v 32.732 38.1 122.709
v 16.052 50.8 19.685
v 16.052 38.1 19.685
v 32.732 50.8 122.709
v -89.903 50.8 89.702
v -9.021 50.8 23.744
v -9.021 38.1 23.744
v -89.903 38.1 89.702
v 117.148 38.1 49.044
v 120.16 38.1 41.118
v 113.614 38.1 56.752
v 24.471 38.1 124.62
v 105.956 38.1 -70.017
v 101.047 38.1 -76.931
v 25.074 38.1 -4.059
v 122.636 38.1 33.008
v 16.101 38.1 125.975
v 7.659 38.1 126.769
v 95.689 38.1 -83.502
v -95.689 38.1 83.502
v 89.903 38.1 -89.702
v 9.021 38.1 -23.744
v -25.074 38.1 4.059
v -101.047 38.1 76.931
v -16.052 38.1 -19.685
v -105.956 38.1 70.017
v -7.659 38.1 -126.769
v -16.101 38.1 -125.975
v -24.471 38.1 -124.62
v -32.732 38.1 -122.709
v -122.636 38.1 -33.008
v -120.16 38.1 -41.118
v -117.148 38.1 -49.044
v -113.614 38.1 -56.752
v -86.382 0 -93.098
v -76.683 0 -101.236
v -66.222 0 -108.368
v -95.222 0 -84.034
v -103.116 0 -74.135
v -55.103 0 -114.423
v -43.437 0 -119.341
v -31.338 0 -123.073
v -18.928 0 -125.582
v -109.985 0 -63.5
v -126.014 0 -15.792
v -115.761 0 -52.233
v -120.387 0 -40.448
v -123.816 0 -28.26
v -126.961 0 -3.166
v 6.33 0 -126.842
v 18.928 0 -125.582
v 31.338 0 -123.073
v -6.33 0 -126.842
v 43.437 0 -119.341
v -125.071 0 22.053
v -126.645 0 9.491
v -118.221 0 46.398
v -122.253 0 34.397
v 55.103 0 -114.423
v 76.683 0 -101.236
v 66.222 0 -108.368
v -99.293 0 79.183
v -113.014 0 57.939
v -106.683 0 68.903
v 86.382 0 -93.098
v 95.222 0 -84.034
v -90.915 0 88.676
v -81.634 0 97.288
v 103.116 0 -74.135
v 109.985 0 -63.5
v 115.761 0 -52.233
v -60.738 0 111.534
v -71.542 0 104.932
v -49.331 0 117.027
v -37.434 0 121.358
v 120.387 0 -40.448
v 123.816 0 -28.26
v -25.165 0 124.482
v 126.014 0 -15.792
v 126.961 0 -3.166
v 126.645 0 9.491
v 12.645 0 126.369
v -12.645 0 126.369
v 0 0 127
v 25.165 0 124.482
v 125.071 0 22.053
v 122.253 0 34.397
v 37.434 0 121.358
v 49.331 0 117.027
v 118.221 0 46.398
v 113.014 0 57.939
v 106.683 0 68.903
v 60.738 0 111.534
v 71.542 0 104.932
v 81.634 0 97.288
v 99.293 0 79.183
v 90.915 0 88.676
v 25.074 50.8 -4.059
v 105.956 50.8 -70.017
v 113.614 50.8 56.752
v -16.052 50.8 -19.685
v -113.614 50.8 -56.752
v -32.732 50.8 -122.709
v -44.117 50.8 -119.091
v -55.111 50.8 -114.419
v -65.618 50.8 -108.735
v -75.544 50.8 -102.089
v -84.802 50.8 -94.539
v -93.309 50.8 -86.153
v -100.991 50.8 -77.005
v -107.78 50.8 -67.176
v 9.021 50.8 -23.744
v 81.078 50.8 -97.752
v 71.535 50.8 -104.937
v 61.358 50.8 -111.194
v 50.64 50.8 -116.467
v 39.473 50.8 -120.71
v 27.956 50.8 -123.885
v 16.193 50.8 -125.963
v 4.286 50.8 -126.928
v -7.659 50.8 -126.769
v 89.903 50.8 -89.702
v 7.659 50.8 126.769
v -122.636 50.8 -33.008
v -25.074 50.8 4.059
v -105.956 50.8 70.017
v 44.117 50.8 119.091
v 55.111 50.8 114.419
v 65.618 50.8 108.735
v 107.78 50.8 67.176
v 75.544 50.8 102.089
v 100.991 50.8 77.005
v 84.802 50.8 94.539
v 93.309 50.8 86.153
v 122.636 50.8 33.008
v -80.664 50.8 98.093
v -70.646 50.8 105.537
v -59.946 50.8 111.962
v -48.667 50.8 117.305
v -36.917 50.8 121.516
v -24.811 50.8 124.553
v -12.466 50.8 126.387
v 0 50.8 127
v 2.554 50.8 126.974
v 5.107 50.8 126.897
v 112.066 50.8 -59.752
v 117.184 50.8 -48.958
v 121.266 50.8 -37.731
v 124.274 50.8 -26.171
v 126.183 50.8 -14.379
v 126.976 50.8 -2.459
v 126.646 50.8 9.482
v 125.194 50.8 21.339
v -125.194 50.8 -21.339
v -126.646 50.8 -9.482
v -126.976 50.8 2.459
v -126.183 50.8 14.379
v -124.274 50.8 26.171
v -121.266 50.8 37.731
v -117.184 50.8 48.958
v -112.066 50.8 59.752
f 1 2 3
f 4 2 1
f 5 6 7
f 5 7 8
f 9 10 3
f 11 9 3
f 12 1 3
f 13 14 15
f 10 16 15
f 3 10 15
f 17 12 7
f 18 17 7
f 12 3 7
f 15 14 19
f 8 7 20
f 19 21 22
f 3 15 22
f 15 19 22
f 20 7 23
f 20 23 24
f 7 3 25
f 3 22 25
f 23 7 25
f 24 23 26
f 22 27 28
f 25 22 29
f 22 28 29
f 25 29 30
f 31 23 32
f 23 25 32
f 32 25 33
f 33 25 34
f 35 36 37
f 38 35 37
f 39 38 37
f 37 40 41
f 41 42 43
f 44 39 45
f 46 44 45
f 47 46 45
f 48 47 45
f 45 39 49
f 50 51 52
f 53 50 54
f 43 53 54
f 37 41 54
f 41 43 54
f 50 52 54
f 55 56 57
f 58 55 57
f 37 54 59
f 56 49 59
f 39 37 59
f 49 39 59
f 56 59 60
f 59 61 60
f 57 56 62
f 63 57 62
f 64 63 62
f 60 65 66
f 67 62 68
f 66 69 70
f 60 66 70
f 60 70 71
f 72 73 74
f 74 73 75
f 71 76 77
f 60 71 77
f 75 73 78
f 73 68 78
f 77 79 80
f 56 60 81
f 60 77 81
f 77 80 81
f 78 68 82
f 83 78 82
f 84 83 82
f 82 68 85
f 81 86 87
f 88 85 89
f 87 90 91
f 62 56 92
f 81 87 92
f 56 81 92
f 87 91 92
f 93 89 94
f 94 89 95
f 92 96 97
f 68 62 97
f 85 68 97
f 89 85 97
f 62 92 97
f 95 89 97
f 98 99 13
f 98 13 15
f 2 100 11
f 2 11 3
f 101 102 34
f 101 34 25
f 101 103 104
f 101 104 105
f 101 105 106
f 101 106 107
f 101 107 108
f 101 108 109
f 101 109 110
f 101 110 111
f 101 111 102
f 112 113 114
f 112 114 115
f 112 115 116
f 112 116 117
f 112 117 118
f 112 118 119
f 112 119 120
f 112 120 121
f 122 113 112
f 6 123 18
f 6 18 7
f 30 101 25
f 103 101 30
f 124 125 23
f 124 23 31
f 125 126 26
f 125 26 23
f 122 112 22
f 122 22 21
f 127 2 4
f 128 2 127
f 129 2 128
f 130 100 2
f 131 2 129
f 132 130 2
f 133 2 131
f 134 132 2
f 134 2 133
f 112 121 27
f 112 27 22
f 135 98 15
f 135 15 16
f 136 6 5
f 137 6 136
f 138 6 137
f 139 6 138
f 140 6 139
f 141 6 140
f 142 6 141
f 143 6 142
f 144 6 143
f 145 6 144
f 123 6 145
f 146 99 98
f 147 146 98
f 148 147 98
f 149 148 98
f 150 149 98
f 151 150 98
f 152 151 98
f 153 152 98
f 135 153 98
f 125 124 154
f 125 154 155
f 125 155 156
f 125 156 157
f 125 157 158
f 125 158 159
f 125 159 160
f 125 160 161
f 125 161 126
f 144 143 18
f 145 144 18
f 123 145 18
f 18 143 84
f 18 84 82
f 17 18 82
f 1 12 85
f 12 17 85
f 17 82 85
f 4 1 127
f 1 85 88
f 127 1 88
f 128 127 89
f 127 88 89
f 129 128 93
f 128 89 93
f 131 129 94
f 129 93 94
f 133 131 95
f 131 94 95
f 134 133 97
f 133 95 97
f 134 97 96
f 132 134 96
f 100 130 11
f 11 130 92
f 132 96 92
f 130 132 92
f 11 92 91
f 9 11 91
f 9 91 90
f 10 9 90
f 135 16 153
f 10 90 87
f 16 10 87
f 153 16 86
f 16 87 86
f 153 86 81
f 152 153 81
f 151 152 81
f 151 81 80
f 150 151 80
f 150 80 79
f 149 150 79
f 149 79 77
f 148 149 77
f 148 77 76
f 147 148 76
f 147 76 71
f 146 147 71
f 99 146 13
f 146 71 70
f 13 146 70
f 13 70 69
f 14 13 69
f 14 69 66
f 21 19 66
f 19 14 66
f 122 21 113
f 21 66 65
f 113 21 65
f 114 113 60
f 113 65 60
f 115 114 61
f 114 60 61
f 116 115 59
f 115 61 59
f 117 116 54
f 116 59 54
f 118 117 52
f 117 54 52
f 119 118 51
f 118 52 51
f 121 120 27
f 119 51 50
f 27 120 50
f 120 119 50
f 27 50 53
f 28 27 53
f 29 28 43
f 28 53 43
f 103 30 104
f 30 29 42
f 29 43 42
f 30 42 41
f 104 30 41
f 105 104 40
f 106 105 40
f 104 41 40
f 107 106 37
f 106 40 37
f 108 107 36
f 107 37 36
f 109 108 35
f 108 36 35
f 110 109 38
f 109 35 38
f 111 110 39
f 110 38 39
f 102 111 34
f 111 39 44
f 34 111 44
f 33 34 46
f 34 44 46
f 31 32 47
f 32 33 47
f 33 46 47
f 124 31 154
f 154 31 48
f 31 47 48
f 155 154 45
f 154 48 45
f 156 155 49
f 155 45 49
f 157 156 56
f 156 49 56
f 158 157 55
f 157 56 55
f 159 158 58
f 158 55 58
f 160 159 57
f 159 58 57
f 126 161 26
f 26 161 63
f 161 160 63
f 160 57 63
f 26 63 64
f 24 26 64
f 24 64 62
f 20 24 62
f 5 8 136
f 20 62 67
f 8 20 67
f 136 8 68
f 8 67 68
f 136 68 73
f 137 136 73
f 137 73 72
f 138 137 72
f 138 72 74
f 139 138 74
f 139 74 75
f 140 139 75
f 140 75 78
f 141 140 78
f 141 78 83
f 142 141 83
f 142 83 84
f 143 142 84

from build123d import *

# Parameters (mm, degrees)
SKETCH1_R           = 127
BOSS_EXTRUDE1_DEPTH = 50.8
CUT_EXTRUDE1_DEPTH  = 12.7


with BuildPart() as part:
    # Sketch1 → Boss-Extrude1 (new body)
    with BuildSketch(Plane(origin=(0, 0, 0), x_dir=(1, 0, 0), z_dir=(0, 1, 0))):
        with Locations(Location((0, 0, 0), (0, 0, 270))):
            Circle(SKETCH1_R)
    extrude(amount=BOSS_EXTRUDE1_DEPTH)

    # Sketch2 → Cut-Extrude1 (cut)
    with BuildSketch(Plane(origin=(0, 50.8, 0), x_dir=(1, 0, 0), z_dir=(0, 1, 0))):
        Polygon((-90.39681042, -90.103865988), (-106.44912427, -70.419272519), (-25.073514933, -4.05941485), (-123.230642135, 33.23400125), (-114.209441053, 56.978009569), (-16.052313851, 19.684593469), (-32.833831715, 123.337867238), (-7.760316782, 127.397282088), (9.021201082, 23.744008319), (90.39681042, 90.103865988), (106.44912427, 70.419272519), (25.073514933, 4.05941485), (123.230642135, -33.23400125), (114.209441053, -56.978009569), (16.052313851, -19.684593469), (32.833831715, -123.337867238), (7.760316782, -127.397282088), (-9.021201082, -23.744008319), align=None)
    extrude(amount=-CUT_EXTRUDE1_DEPTH, mode=Mode.SUBTRACT)


solid = part.part
